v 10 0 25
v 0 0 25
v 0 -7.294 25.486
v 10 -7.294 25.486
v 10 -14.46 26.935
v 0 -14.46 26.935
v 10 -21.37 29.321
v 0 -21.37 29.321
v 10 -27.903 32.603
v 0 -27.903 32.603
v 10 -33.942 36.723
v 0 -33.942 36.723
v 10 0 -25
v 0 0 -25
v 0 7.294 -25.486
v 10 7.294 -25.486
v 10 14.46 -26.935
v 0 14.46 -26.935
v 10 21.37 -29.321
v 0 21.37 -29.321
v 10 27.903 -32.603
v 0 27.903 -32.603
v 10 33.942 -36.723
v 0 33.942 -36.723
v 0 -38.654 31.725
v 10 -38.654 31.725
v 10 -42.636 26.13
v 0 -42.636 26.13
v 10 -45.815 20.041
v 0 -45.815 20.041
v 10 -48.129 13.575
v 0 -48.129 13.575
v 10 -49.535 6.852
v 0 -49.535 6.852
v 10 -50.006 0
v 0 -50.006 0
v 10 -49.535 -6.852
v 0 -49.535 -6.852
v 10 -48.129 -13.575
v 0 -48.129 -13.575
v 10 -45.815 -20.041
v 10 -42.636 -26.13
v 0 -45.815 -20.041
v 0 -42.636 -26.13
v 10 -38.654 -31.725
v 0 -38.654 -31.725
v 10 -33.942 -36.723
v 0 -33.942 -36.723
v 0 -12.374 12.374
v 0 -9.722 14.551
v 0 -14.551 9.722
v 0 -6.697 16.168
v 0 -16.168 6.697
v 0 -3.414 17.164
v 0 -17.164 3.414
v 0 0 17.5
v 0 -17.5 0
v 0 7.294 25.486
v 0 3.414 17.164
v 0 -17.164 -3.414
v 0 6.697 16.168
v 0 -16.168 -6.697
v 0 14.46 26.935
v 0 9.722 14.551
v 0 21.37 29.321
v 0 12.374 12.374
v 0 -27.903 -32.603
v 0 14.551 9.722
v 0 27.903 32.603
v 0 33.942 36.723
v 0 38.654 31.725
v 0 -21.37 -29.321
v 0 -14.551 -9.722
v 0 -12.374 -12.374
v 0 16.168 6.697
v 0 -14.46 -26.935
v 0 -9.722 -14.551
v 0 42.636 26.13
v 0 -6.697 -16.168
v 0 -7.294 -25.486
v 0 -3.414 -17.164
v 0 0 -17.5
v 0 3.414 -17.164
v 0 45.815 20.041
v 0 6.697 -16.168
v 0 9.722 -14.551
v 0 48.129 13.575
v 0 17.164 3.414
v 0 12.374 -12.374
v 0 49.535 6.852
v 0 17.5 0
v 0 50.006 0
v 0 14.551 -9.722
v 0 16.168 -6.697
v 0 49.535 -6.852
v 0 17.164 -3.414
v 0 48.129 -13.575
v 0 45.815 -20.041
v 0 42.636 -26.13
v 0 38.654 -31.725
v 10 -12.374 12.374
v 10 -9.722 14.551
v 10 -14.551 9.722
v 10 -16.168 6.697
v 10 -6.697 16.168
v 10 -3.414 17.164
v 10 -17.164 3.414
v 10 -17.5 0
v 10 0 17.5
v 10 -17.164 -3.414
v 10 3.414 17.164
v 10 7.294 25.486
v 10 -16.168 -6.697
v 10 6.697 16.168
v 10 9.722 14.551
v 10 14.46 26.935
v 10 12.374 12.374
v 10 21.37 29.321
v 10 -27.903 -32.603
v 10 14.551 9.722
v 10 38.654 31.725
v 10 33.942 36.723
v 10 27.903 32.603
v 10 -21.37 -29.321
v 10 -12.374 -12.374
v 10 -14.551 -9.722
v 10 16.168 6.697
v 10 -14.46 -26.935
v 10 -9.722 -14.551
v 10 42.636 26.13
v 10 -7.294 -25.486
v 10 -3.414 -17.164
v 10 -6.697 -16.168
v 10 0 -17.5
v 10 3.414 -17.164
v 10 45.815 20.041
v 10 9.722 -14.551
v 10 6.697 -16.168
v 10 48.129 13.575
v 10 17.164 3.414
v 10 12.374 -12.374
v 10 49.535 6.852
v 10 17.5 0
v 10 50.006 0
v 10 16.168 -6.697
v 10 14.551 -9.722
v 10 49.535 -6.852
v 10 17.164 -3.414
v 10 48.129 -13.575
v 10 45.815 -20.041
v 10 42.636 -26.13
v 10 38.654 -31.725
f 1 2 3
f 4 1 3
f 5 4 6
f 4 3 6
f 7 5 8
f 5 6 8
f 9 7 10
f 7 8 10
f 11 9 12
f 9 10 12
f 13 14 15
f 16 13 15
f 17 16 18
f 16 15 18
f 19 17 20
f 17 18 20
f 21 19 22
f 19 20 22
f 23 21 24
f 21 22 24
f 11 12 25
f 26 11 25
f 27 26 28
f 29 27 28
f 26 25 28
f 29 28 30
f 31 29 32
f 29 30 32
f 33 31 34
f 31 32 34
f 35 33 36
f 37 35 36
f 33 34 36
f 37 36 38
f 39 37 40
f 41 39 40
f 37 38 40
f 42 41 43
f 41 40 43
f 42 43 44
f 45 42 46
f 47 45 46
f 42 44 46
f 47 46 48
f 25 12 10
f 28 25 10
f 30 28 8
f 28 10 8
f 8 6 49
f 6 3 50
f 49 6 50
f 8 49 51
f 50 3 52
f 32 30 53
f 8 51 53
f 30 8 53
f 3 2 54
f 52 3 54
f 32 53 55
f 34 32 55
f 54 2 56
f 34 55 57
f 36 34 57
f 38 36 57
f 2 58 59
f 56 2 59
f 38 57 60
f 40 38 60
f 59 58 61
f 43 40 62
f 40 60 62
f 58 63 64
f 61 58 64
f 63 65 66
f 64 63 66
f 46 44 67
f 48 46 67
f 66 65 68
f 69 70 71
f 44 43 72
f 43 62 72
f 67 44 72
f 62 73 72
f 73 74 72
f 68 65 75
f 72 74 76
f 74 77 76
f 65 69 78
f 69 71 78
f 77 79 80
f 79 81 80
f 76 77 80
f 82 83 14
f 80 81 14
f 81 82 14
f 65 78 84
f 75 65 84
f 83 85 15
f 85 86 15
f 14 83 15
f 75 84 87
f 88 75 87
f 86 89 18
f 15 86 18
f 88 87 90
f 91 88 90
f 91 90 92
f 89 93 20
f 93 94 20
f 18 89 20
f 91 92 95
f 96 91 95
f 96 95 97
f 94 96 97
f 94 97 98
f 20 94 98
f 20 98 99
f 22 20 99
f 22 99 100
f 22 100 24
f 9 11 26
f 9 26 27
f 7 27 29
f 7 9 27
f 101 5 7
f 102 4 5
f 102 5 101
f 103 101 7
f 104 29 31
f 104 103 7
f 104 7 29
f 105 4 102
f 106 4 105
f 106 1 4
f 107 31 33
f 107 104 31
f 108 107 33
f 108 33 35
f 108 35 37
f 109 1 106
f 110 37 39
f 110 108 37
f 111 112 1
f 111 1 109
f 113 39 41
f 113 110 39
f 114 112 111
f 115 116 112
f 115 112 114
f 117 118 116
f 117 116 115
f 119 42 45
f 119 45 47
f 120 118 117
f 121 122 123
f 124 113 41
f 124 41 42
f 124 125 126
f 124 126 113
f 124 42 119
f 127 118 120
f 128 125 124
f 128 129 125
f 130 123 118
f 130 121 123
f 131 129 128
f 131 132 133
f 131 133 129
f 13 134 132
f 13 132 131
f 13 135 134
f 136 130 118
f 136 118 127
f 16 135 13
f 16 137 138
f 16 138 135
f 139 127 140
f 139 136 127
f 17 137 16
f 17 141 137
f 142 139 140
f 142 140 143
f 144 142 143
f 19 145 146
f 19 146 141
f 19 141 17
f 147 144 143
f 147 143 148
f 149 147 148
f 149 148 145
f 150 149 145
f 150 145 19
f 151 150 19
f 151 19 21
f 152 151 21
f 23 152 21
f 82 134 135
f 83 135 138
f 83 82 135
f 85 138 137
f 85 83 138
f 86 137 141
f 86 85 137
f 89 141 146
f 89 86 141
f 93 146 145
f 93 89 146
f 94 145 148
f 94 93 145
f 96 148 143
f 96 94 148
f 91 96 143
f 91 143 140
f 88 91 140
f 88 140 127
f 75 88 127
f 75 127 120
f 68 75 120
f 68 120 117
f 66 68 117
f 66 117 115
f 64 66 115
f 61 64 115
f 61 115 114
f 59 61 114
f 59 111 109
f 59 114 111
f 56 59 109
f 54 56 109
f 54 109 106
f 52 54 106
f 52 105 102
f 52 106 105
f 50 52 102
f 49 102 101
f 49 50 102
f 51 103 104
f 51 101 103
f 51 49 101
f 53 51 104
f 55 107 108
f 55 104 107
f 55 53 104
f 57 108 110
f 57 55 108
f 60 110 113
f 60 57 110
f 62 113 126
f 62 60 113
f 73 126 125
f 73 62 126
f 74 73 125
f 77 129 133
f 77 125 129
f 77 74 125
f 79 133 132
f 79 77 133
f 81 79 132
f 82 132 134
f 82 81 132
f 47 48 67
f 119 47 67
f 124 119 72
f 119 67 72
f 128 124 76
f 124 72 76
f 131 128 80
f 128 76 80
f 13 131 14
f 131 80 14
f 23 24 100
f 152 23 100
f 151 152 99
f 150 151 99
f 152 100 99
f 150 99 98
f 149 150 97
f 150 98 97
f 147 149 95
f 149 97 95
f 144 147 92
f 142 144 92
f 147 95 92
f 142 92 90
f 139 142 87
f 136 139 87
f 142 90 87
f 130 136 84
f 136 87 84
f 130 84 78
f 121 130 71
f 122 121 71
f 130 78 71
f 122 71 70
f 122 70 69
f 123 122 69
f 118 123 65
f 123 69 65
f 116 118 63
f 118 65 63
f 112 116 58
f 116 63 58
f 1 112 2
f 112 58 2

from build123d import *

# Parameters (mm, degrees)
BOSS_EXTRUDE1_DEPTH = 10
SKETCH3_R           = 17.5
CUT_EXTRUDE3_DEPTH  = 63.842489918


with BuildPart() as part:
    # Sketch1 → Boss-Extrude1 (new body)
    with BuildSketch(Plane(origin=(0, 0, 0), x_dir=(0, 0, -1), z_dir=(1, 0, 0))):
        with BuildLine():
            ThreePointArc((-36.722656494, 33.942179351), (-28.013204115, 17.954750168), (-25, 0))
            ThreePointArc((-25, 0), (-28.013204115, -17.954750168), (-36.722656494, -33.942179351))
            ThreePointArc((-36.722656494, -33.942179351), (0, -50.00625), (36.722656494, -33.942179351))
            ThreePointArc((36.722656494, -33.942179351), (28.013204115, -17.954750168), (25, 0))
            ThreePointArc((25, 0), (28.013204115, 17.954750168), (36.722656494, 33.942179351))
            ThreePointArc((36.722656494, 33.942179351), (0, 50.00625), (-36.722656494, 33.942179351))
        make_face()
    extrude(amount=BOSS_EXTRUDE1_DEPTH)

    # Sketch3 → Cut-Extrude3 (cut, through all)
    with BuildSketch(Plane(origin=(0, 0, 0), x_dir=(0, 0, -1), z_dir=(1, 0, 0))):
        Circle(SKETCH3_R)
    extrude(amount=CUT_EXTRUDE3_DEPTH, mode=Mode.SUBTRACT)


solid = part.part
